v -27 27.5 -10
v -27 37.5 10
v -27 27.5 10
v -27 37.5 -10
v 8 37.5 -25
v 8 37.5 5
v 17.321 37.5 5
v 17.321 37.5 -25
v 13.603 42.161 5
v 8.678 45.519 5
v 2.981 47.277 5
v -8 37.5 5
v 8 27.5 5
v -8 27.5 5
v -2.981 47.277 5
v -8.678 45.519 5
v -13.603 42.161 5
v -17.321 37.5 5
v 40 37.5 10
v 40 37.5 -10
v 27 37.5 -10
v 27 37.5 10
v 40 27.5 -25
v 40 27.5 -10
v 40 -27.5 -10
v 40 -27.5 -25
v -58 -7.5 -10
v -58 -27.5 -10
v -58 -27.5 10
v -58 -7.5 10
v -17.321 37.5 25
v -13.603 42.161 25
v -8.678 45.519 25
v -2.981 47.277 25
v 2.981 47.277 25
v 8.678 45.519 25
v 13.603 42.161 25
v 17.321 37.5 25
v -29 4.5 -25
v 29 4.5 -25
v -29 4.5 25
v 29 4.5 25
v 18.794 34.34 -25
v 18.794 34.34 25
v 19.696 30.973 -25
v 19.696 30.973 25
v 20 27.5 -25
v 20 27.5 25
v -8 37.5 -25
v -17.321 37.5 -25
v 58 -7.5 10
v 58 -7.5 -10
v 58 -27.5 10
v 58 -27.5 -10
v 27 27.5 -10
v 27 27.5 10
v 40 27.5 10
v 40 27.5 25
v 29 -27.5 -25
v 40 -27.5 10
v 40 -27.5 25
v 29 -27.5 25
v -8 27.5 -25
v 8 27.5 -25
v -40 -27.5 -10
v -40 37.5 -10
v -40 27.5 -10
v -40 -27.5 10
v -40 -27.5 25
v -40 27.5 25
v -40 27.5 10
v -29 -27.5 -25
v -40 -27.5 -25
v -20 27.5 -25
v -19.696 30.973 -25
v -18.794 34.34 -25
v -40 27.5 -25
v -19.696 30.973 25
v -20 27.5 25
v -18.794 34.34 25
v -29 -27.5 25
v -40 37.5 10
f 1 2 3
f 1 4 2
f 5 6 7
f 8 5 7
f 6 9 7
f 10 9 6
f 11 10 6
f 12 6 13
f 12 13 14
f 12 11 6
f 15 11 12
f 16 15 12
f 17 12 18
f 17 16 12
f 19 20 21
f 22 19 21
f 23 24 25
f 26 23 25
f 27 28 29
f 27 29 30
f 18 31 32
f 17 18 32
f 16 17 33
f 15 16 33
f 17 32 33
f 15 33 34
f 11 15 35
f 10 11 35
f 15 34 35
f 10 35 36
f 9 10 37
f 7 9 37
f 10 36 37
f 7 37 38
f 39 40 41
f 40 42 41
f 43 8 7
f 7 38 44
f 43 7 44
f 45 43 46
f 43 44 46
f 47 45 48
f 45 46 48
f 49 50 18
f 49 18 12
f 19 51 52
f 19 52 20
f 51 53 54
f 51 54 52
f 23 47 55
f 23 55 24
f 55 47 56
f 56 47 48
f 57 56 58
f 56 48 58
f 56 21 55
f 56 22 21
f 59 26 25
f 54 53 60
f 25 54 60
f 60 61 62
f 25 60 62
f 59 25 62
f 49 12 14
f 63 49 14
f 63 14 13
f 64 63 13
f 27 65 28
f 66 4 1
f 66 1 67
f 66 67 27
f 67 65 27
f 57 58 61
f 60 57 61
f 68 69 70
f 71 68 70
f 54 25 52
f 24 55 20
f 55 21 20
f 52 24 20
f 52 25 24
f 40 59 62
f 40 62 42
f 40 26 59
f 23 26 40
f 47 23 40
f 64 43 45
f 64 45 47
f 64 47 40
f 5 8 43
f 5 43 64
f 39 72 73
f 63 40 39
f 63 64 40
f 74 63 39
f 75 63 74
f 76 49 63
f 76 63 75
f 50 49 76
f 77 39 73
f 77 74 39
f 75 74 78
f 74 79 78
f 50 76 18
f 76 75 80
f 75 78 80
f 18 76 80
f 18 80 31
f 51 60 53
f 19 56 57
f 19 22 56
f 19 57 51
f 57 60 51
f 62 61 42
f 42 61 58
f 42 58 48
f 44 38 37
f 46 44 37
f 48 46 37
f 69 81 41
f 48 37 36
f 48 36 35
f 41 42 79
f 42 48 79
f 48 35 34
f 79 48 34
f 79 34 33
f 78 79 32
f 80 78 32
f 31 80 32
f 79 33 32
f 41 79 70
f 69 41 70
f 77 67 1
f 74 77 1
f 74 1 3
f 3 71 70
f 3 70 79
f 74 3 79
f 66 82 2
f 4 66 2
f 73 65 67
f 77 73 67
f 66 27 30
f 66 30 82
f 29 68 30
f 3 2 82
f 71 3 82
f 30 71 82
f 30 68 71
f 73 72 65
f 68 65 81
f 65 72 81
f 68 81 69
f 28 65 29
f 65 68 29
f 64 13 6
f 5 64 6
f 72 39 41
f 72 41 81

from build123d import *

# Parameters (mm, degrees)
BOSS_EXTRUDE1_DEPTH = 25
BOSS_EXTRUDE2_DEPTH = 20
BOSS_EXTRUDE3_DEPTH = 10


with BuildPart() as part:
    # Sketch1 → Boss-Extrude1 (new, symmetric)
    with BuildSketch(Plane.XY):
        with BuildLine():
            Line((-40, -27.5), (-40, 27.5))
            Line((-40, 27.5), (-20, 27.5))
            ThreePointArc((-20, 27.5), (-19.318516526, 32.676380902), (-17.320508076, 37.5))
            Line((-17.320508076, 37.5), (-8, 37.5))
            Line((-8, 37.5), (-8, 27.5))
            Line((-8, 27.5), (8, 27.5))
            Line((8, 27.5), (8, 37.5))
            Line((8, 37.5), (17.320508076, 37.5))
            ThreePointArc((17.320508076, 37.5), (19.318516526, 32.676380902), (20, 27.5))
            Line((20, 27.5), (40, 27.5))
            Line((40, 27.5), (40, -27.5))
            Line((40, -27.5), (29, -27.5))
            Line((29, -27.5), (29, 4.5))
            Line((29, 4.5), (-29, 4.5))
            Line((-29, 4.5), (-29, -27.5))
            Line((-29, -27.5), (-40, -27.5))
        make_face()
    extrude(amount=BOSS_EXTRUDE1_DEPTH, both=True)

    # Sketch2 → Boss-Extrude2 (add)
    with BuildSketch(Plane.XY.offset(25)):
        with BuildLine():
            Line((17.320508076, 37.5), (8, 37.5))
            Line((8, 37.5), (8, 27.5))
            Line((8, 27.5), (-8, 27.5))
            Line((-8, 27.5), (-8, 37.5))
            Line((-8, 37.5), (-17.320508076, 37.5))
            ThreePointArc((-17.320508076, 37.5), (0, 47.5), (17.320508076, 37.5))
        make_face()
    extrude(amount=-BOSS_EXTRUDE2_DEPTH)

    # Sketch3 → Boss-Extrude3 (add, symmetric)
    with BuildSketch(Plane.XY):
        Polygon((-40, 27.5), (-40, -27.5), (-58, -27.5), (-58, -7.5), (-40, 37.5), (-27, 37.5), (-27, 27.5), align=None)
        Polygon((27, 27.5), (40, 27.5), (40, -27.5), (58, -27.5), (58, -7.5), (40, 37.5), (27, 37.5), align=None)
    extrude(amount=BOSS_EXTRUDE3_DEPTH, both=True)


solid = part.part
